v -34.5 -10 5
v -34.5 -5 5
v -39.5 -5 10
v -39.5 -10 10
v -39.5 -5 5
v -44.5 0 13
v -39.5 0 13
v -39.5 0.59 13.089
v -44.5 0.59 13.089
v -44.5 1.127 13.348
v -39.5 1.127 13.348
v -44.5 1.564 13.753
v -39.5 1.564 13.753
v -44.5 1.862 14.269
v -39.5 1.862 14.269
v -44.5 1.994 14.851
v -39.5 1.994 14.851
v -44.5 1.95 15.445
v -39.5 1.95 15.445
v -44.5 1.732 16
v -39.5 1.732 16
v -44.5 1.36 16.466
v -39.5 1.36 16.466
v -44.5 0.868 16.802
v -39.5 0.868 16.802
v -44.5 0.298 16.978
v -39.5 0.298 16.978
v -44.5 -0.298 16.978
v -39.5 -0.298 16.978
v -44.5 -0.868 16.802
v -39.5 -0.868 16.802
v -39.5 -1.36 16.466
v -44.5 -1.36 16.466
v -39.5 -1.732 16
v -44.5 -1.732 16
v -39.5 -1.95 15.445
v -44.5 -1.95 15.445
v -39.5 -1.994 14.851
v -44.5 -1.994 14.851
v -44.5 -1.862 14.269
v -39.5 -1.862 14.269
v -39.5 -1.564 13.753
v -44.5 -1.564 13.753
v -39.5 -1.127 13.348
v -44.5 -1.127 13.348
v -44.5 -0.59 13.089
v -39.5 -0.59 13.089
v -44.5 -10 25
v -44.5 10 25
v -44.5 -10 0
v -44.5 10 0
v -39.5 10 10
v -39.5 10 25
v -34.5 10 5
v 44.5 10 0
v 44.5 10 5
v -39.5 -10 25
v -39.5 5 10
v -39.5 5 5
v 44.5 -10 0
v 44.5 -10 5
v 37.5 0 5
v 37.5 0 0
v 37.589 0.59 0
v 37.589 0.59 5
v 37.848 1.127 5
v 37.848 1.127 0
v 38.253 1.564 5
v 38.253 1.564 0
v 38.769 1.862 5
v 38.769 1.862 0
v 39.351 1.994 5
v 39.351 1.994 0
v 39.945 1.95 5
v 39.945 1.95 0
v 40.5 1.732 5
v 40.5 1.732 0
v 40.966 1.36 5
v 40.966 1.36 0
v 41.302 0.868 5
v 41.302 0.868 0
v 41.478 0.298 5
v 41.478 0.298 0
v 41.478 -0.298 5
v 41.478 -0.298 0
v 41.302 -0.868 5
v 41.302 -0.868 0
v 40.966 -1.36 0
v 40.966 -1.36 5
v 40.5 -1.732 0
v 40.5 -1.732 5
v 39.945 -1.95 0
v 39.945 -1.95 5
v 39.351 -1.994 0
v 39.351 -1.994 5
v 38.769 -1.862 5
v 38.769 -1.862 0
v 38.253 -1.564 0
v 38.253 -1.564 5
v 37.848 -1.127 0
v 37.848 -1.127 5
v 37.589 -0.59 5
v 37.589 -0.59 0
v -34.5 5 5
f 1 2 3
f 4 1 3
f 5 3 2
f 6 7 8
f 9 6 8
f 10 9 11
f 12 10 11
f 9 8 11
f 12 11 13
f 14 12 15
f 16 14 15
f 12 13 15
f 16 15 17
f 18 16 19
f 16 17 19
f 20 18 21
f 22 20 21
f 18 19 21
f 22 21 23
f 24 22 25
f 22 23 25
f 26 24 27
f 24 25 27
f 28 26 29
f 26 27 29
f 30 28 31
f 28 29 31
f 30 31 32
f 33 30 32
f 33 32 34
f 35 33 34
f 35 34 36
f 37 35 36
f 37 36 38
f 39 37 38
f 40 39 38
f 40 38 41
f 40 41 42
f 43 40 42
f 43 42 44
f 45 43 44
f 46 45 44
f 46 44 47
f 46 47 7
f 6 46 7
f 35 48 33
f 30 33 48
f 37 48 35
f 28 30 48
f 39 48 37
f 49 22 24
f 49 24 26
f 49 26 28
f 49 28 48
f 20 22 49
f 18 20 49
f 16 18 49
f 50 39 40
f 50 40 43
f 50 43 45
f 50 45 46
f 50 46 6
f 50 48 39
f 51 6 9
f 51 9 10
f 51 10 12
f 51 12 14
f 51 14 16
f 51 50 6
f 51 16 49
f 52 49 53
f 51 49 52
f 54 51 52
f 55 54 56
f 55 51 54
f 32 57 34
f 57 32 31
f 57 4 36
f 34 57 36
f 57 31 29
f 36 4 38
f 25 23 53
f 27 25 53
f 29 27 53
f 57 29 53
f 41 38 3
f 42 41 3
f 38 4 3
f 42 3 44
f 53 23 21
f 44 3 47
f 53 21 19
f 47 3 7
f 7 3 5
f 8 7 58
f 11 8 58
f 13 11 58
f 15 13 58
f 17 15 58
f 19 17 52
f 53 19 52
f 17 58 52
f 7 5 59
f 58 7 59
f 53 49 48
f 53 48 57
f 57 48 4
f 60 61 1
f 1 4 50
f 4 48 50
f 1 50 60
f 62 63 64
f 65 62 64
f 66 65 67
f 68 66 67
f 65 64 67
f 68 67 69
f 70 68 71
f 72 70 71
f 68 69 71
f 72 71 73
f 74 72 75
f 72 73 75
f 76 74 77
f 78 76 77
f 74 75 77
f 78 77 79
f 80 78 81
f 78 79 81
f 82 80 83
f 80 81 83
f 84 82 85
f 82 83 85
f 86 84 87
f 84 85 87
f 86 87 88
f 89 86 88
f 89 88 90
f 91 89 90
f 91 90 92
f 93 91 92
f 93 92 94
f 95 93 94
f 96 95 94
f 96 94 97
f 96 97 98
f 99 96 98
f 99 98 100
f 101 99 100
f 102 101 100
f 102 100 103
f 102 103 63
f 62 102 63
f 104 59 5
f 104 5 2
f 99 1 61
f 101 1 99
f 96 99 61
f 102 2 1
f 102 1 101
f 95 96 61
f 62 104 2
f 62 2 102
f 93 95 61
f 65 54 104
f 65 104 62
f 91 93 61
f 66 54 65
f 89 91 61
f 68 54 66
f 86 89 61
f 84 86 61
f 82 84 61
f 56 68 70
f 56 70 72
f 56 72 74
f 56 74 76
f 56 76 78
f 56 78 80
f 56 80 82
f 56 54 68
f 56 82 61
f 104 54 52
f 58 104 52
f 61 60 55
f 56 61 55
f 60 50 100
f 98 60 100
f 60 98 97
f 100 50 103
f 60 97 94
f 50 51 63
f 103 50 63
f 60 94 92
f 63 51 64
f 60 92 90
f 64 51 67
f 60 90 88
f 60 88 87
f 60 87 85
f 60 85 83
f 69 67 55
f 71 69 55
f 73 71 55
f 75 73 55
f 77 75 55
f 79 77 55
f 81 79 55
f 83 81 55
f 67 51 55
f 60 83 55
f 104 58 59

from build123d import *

# Parameters (mm, degrees)
SKETCH1_W           = 89
SKETCH1_H           = 20
BOSS_EXTRUDE1_DEPTH = 5
SKETCH2_W           = 5
SKETCH2_H           = 20
BOSS_EXTRUDE2_DEPTH = 20
SKETCH3_R           = 2
CUT_EXTRUDE1_DEPTH  = 89.20997676
SKETCH4_R           = 2
CUT_EXTRUDE2_DEPTH  = 20
SKETCH5_W           = 5
SKETCH5_H           = 5
BOSS_EXTRUDE3_DEPTH = 5
CUT_EXTRUDE3_DEPTH  = 55.820160525


with BuildPart() as part:
    # Sketch1 → Boss-Extrude1 (new body)
    with BuildSketch(Plane.XY):
        Rectangle(SKETCH1_W, SKETCH1_H)
    extrude(amount=BOSS_EXTRUDE1_DEPTH)

    # Sketch2 → Boss-Extrude2 (add)
    with BuildSketch(Plane.XY.offset(5)):
        with Locations((-42, 0)):
            Rectangle(SKETCH2_W, SKETCH2_H)
    extrude(amount=BOSS_EXTRUDE2_DEPTH)

    # Sketch3 → Cut-Extrude1 (cut, through all)
    with BuildSketch(Plane(origin=(-39.5, 0, 0), x_dir=(0, 0, -1), z_dir=(1, 0, 0))):
        with Locations((-15, 0)):
            Circle(SKETCH3_R)
    extrude(amount=-CUT_EXTRUDE1_DEPTH, mode=Mode.SUBTRACT)

    # Sketch4 → Cut-Extrude2 (cut)
    with BuildSketch(Plane(origin=(0, 0, 0), x_dir=(-1, 0, 0), z_dir=(0, 0, -1))):
        with Locations((-39.5, 0)):
            Circle(SKETCH4_R)
    extrude(amount=-CUT_EXTRUDE2_DEPTH, mode=Mode.SUBTRACT)

    # Sketch5 → Boss-Extrude3 (add)
    with BuildSketch(Plane(origin=(-39.5, 0, 0), x_dir=(0, 0, -1), z_dir=(1, 0, 0))):
        with Locations((-7.5, -7.5)):
            Rectangle(SKETCH5_W, SKETCH5_H)
        with Locations((-7.5, 7.5)):
            Rectangle(SKETCH5_W, SKETCH5_H)
    extrude(amount=BOSS_EXTRUDE3_DEPTH)

    # Sketch6 → Cut-Extrude3 (cut, through all)
    with BuildSketch(Plane(origin=(0, 10, 0), x_dir=(1, 0, 0), z_dir=(0, 1, 0))):
        Polygon((-34.5, -5), (-39.5, -10), (-34.5, -10), align=None)
    extrude(amount=-CUT_EXTRUDE3_DEPTH, mode=Mode.SUBTRACT)


solid = part.part
